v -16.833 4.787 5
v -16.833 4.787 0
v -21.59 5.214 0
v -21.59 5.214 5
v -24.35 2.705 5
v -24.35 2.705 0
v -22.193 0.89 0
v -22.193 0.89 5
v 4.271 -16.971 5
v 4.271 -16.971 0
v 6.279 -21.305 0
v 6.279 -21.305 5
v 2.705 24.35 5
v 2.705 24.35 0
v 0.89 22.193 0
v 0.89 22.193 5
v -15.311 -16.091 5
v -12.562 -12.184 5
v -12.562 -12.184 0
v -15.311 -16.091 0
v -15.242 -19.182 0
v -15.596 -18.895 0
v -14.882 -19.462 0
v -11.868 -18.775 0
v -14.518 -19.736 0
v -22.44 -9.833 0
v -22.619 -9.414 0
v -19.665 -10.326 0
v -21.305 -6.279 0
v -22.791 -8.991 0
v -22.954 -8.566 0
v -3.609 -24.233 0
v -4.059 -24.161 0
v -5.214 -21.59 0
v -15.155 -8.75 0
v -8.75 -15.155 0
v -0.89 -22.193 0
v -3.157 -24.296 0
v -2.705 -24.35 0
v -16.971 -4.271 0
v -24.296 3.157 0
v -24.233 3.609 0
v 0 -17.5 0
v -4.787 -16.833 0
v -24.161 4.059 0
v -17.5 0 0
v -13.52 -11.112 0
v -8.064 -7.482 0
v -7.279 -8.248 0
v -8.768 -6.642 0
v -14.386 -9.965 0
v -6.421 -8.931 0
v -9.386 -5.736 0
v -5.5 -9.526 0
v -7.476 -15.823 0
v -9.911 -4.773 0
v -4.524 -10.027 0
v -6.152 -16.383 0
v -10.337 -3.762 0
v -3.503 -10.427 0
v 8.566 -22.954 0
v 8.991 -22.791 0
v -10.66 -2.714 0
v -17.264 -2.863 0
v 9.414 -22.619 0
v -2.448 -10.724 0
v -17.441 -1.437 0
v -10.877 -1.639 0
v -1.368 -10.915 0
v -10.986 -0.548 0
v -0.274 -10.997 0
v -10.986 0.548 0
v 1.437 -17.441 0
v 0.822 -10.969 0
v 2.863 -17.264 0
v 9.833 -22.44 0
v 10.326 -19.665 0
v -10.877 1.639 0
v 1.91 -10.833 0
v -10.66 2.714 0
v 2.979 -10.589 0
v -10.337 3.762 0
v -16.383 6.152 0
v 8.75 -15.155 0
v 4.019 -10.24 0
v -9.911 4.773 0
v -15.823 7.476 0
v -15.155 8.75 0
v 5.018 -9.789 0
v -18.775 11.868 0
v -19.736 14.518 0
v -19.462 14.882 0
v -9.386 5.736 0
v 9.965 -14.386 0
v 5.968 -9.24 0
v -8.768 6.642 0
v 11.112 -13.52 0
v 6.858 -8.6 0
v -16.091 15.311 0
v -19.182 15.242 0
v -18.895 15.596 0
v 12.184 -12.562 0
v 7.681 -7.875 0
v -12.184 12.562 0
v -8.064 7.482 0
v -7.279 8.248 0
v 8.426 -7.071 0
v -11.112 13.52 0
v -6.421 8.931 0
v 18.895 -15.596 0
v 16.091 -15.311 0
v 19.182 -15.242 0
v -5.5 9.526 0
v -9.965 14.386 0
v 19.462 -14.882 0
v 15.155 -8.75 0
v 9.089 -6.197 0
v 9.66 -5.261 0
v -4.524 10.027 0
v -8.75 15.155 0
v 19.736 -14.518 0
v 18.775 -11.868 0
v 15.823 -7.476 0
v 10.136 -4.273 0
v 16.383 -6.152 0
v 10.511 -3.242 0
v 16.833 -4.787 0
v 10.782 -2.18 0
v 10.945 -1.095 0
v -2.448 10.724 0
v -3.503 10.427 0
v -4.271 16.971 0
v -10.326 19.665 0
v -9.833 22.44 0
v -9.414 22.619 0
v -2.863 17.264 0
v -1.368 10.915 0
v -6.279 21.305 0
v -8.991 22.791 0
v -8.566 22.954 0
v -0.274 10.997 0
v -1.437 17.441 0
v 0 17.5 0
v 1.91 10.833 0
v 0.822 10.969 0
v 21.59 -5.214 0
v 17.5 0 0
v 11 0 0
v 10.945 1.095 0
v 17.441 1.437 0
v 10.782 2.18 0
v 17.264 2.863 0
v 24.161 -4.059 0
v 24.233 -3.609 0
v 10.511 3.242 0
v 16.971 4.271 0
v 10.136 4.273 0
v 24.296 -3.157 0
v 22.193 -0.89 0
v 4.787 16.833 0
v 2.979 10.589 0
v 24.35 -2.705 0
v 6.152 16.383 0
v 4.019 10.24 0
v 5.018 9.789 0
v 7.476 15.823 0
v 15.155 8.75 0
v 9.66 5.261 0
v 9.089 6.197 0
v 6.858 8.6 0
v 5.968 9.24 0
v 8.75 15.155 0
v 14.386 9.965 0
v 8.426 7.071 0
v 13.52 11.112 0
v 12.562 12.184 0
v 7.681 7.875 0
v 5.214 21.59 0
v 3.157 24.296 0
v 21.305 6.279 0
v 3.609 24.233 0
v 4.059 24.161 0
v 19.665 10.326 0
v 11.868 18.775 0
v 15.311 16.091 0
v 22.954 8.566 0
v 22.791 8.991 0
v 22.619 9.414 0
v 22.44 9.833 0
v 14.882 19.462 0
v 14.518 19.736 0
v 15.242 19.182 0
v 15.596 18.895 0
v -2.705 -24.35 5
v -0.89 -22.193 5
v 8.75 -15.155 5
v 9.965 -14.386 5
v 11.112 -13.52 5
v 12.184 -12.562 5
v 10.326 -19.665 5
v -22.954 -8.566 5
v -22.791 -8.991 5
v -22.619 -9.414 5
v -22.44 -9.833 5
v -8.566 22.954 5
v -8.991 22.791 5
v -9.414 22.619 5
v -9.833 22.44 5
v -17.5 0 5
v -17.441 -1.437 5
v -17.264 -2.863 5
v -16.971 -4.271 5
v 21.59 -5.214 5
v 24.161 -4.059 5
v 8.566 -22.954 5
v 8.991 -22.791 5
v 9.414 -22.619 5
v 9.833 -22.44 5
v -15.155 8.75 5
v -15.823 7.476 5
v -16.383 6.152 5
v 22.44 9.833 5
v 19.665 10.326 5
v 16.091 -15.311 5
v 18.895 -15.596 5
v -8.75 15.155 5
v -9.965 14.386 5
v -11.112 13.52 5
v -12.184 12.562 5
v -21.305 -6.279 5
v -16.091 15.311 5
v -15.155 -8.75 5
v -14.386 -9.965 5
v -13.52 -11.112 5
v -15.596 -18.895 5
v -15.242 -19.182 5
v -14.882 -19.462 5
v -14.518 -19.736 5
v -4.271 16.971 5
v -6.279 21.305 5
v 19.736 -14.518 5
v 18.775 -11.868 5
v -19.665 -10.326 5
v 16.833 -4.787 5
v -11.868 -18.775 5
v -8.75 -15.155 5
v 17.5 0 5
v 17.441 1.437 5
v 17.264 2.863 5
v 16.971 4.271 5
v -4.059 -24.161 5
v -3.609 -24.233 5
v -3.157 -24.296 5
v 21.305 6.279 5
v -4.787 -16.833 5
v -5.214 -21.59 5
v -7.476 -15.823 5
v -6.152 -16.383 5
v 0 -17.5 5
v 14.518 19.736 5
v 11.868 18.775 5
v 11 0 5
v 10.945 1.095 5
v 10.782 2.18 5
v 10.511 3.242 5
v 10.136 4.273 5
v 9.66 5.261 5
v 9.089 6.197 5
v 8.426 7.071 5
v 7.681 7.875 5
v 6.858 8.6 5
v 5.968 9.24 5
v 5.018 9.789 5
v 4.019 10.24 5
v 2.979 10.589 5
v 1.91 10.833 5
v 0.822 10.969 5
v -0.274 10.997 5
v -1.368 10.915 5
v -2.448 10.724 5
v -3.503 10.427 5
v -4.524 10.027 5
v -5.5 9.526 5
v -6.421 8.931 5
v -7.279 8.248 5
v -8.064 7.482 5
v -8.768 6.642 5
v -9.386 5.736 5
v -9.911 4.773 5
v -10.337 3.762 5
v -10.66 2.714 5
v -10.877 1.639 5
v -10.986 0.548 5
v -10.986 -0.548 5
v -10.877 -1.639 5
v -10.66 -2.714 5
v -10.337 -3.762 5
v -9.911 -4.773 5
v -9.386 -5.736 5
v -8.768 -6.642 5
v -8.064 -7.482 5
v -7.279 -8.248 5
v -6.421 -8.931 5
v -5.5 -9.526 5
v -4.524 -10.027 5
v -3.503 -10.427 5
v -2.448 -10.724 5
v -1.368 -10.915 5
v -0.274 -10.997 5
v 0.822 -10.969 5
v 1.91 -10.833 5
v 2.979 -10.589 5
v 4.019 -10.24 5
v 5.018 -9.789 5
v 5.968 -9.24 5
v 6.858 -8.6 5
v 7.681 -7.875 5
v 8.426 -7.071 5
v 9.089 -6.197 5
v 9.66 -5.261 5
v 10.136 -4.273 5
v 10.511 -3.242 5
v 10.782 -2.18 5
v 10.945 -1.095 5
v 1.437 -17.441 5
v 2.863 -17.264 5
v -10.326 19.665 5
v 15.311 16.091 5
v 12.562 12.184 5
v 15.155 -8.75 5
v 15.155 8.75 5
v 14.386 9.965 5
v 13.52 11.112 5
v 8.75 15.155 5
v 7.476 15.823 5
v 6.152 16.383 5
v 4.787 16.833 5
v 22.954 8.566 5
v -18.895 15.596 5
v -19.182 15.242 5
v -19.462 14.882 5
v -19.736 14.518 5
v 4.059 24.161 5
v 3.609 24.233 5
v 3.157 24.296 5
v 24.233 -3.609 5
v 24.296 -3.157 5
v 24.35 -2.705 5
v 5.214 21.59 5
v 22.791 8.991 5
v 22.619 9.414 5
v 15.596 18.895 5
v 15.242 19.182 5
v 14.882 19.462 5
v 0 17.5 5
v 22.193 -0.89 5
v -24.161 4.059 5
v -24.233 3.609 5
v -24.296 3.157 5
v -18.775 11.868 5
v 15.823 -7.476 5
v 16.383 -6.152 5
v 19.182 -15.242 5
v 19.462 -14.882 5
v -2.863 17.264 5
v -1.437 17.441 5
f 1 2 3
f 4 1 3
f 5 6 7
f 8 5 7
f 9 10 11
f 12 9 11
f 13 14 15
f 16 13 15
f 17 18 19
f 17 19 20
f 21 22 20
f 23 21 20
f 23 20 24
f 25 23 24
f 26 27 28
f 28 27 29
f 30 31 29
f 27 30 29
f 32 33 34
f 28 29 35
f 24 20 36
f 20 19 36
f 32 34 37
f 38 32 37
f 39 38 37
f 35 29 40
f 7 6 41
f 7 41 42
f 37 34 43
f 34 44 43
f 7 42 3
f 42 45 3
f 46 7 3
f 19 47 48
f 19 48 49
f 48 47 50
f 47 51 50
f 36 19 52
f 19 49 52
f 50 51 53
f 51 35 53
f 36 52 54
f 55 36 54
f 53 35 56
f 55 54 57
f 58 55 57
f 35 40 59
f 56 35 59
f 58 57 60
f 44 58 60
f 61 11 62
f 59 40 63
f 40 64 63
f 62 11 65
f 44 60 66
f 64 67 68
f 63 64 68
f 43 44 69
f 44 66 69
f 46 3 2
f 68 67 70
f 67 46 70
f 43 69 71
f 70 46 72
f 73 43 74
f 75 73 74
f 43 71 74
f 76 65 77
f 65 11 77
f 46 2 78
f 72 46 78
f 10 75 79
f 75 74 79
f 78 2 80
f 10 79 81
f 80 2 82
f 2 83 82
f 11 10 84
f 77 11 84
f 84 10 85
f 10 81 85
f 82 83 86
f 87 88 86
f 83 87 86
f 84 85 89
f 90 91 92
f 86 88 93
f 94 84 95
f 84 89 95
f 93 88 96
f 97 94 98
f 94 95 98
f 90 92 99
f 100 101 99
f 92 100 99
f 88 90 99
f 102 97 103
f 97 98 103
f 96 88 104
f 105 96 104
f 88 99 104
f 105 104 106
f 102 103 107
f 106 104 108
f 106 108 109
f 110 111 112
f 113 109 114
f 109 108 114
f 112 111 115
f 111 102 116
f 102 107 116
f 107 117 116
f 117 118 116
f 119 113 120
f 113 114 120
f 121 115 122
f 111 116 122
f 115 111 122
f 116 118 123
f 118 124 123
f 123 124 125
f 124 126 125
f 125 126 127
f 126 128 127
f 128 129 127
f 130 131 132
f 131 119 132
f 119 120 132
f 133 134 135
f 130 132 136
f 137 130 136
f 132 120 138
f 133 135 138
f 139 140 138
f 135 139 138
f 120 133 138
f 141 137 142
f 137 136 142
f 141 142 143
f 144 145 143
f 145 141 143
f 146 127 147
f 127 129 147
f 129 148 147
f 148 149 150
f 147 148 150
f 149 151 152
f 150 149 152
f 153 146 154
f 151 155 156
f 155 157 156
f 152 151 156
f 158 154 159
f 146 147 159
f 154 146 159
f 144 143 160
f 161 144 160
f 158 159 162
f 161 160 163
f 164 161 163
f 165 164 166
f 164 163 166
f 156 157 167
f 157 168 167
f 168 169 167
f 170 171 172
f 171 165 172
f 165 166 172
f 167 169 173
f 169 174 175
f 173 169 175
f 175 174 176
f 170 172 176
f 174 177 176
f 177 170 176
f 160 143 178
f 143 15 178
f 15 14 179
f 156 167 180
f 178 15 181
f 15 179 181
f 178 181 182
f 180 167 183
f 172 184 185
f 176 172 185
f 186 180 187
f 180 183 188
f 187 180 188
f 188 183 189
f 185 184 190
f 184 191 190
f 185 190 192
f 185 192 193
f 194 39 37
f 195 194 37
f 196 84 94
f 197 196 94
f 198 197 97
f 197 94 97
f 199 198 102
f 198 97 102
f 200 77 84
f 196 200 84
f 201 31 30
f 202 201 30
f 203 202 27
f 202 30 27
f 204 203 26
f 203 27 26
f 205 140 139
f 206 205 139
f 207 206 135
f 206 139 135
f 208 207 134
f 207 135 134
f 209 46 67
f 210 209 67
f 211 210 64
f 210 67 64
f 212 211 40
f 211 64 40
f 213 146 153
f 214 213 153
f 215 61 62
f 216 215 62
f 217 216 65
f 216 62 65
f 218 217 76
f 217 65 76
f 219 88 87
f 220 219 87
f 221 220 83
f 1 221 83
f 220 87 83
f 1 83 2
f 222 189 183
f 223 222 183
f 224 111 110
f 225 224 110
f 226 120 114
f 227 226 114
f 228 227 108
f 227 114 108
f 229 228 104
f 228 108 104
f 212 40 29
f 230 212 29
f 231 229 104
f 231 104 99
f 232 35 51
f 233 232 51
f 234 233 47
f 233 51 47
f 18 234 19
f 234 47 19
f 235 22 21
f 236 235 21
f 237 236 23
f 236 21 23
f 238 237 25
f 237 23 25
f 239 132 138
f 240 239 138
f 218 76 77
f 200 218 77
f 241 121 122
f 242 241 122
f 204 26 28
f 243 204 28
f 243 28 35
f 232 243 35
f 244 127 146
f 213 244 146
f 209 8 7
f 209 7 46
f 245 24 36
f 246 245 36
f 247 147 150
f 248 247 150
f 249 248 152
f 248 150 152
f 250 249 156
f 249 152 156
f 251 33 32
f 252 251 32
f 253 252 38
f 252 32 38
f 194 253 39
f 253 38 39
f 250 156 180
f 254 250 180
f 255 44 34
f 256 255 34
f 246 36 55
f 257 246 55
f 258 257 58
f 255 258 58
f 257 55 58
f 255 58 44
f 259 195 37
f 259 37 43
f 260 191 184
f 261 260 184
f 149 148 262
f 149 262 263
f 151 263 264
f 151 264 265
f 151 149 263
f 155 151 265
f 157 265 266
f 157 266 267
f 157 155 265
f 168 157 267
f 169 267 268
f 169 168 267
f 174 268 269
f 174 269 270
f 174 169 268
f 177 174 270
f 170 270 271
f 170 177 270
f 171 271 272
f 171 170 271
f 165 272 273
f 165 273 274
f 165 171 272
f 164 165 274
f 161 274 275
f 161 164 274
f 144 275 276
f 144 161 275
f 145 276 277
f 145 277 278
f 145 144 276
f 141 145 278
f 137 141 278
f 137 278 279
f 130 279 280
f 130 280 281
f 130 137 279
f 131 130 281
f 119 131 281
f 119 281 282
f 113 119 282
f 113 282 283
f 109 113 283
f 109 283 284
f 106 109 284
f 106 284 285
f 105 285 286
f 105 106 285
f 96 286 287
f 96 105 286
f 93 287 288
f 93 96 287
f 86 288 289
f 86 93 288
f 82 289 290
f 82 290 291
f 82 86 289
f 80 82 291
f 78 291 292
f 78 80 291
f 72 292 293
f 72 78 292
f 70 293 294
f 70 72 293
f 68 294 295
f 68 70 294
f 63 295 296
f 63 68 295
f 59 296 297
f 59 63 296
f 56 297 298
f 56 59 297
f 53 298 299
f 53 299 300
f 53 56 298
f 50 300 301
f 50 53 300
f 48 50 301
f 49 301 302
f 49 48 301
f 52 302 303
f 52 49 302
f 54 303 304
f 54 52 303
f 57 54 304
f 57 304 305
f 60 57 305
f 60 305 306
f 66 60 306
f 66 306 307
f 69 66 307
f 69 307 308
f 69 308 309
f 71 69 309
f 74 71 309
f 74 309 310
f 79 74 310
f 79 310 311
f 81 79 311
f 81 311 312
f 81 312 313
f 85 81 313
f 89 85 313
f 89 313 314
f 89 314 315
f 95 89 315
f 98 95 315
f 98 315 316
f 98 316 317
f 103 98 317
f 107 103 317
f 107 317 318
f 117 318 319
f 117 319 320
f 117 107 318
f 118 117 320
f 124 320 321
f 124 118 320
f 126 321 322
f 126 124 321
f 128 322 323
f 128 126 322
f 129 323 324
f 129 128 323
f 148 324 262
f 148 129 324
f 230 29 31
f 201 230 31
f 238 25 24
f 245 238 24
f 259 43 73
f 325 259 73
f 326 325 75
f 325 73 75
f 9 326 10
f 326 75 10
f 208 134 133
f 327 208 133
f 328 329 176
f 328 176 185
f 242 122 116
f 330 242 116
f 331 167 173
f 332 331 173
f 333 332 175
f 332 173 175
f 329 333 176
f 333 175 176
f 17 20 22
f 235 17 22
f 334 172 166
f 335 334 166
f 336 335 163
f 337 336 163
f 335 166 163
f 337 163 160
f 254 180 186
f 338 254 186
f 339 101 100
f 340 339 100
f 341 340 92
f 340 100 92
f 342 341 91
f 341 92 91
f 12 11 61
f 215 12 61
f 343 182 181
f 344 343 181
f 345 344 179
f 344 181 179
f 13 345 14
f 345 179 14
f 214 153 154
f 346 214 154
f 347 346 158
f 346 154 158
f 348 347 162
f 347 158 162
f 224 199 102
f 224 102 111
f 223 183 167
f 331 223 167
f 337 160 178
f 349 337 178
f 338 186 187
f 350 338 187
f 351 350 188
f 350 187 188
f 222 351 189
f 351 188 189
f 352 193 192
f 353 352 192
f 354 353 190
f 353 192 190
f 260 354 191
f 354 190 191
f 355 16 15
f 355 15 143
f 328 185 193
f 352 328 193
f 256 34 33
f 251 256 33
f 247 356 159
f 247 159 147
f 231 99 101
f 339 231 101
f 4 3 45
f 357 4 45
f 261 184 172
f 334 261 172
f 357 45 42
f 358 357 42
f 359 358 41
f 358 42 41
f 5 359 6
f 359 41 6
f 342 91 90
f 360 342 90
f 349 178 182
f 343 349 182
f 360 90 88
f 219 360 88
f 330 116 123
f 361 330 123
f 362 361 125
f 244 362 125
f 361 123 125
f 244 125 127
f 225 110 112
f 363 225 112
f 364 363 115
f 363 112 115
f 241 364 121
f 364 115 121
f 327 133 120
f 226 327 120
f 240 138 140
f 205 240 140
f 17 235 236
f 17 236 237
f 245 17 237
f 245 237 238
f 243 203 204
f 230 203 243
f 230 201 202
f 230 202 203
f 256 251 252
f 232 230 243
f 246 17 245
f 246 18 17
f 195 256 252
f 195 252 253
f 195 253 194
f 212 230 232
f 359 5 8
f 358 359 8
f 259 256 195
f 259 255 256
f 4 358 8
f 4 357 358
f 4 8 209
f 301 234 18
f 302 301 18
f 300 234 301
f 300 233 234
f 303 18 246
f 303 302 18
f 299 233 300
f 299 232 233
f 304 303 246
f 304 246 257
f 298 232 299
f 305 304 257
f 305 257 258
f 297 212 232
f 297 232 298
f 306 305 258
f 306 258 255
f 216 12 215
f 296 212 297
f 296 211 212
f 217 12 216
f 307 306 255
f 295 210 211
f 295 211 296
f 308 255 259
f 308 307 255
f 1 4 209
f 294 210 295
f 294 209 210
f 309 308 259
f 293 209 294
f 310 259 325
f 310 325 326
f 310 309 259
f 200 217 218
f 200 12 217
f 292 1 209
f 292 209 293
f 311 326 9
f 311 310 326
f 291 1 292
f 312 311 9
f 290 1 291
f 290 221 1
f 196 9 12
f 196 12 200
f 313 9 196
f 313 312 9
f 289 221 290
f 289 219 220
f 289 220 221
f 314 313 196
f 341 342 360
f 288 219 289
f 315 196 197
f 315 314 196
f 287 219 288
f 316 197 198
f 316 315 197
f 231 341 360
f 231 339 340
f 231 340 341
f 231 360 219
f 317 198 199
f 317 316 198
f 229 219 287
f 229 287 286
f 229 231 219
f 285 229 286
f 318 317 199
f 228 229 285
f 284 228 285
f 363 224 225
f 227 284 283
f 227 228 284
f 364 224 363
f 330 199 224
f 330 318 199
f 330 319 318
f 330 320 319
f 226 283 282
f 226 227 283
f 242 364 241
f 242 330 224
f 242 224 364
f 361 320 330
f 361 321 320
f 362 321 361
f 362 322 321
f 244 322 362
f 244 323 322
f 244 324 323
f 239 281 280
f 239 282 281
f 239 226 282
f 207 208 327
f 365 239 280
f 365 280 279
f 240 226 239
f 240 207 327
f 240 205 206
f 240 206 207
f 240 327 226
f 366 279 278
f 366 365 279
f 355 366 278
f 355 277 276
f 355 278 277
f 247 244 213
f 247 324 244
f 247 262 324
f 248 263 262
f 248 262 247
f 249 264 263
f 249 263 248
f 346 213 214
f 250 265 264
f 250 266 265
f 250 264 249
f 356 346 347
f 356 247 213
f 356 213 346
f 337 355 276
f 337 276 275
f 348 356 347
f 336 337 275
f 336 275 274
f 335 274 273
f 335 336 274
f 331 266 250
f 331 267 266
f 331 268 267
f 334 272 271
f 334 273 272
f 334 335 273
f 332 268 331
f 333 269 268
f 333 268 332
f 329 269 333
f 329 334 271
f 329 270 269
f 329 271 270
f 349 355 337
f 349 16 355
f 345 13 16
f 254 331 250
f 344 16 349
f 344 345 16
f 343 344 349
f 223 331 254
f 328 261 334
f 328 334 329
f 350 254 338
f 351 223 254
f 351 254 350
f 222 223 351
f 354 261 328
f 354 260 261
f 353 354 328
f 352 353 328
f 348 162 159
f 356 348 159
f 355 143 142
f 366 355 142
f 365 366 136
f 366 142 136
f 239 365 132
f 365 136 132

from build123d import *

# Parameters (mm, degrees)
F0_R     = 11
F1_DEPTH = 5


with BuildPart() as f1:
    # F0 (on Top) → F1 (new body)
    with BuildSketch(Plane.XY):
        with BuildLine():
            ThreePointArc((16.8326, -4.786812), (17.332347, -2.416557), (17.5, 0))
            ThreePointArc((17.5, 0), (17.367213, 2.151727), (16.970865, 4.2708))
            ThreePointArc((16.970865, 4.2708), (16.218531, 6.573374), (15.155445, 8.75))
            ThreePointArc((15.155445, 8.75), (13.964584, 10.547056), (12.561801, 12.184054))
            ThreePointArc((12.561801, 12.184054), (10.758973, 13.801974), (8.75, 15.155445))
            ThreePointArc((8.75, 15.155445), (6.820156, 16.116311), (4.786812, 16.8326))
            ThreePointArc((4.786812, 16.8326), (2.416557, 17.332347), (0, 17.5))
            ThreePointArc((0, 17.5), (-2.151727, 17.367213), (-4.2708, 16.970865))
            ThreePointArc((-4.2708, 16.970865), (-6.573374, 16.218531), (-8.75, 15.155445))
            ThreePointArc((-8.75, 15.155445), (-10.547056, 13.964584), (-12.184054, 12.561801))
            ThreePointArc((-12.184054, 12.561801), (-13.801974, 10.758973), (-15.155445, 8.75))
            ThreePointArc((-15.155445, 8.75), (-16.116311, 6.820156), (-16.8326, 4.786812))
            ThreePointArc((-16.8326, 4.786812), (-17.332347, 2.416557), (-17.5, 0))
            ThreePointArc((-17.5, 0), (-17.367213, -2.151727), (-16.970865, -4.2708))
            ThreePointArc((-16.970865, -4.2708), (-16.218531, -6.573374), (-15.155445, -8.75))
            ThreePointArc((-15.155445, -8.75), (-13.964584, -10.547056), (-12.561801, -12.184054))
            ThreePointArc((-12.561801, -12.184054), (-10.758973, -13.801974), (-8.75, -15.155445))
            ThreePointArc((-8.75, -15.155445), (-6.820156, -16.116311), (-4.786812, -16.8326))
            ThreePointArc((-4.786812, -16.8326), (-2.416557, -17.332347), (0, -17.5))
            ThreePointArc((0, -17.5), (2.151727, -17.367213), (4.2708, -16.970865))
            ThreePointArc((4.2708, -16.970865), (6.573374, -16.218531), (8.75, -15.155445))
            ThreePointArc((8.75, -15.155445), (10.547056, -13.964584), (12.184054, -12.561801))
            ThreePointArc((12.184054, -12.561801), (13.801974, -10.758973), (15.155445, -8.75))
            ThreePointArc((15.155445, -8.75), (16.116311, -6.820156), (16.8326, -4.786812))
        make_face()
        Circle(F0_R, mode=Mode.SUBTRACT)
        with BuildLine():
            Line((22.193341, -0.890096), (17.5, 0))
            ThreePointArc((17.5, 0), (17.332347, -2.416557), (16.8326, -4.786812))
            Line((16.8326, -4.786812), (21.59042, -5.214441))
            Line((21.59042, -5.214441), (24.161443, -4.058901))
            ThreePointArc((24.161443, -4.058901), (24.265286, -3.38318), (24.350235, -2.704824))
            Line((24.350235, -2.704824), (22.193341, -0.890096))
        make_face()
        with BuildLine():
            ThreePointArc((15.155445, 8.75), (16.218531, 6.573374), (16.970865, 4.2708))
            Line((16.970865, 4.2708), (21.305073, 6.279372))
            Line((21.305073, 6.279372), (22.953874, 8.56561))
            ThreePointArc((22.953874, 8.56561), (22.705944, 9.202724), (22.440334, 9.832671))
            Line((22.440334, 9.832671), (19.665045, 10.325825))
            Line((19.665045, 10.325825), (15.155445, 8.75))
        make_face()
        with BuildLine():
            Line((18.774949, -11.867516), (15.155445, -8.75))
            ThreePointArc((15.155445, -8.75), (13.801974, -10.758973), (12.184054, -12.561801))
            Line((12.184054, -12.561801), (16.090632, -15.311048))
            Line((16.090632, -15.311048), (18.894973, -15.595833))
            ThreePointArc((18.894973, -15.595833), (19.322764, -15.062562), (19.73551, -14.517564))
            Line((19.73551, -14.517564), (18.774949, -11.867516))
        make_face()
        with BuildLine():
            ThreePointArc((8.75, 15.155445), (10.758973, 13.801974), (12.561801, 12.184054))
            Line((12.561801, 12.184054), (15.311048, 16.090632))
            Line((15.311048, 16.090632), (15.595833, 18.894973))
            ThreePointArc((15.595833, 18.894973), (15.062562, 19.322764), (14.517564, 19.73551))
            Line((14.517564, 19.73551), (11.867516, 18.774949))
            Line((11.867516, 18.774949), (8.75, 15.155445))
        make_face()
        with BuildLine():
            Line((10.325825, -19.665045), (8.75, -15.155445))
            ThreePointArc((8.75, -15.155445), (6.573374, -16.218531), (4.2708, -16.970865))
            Line((4.2708, -16.970865), (6.279372, -21.305073))
            Line((6.279372, -21.305073), (8.56561, -22.953874))
            ThreePointArc((8.56561, -22.953874), (9.202724, -22.705944), (9.832671, -22.440334))
            Line((9.832671, -22.440334), (10.325825, -19.665045))
        make_face()
        with BuildLine():
            ThreePointArc((0, 17.5), (2.416557, 17.332347), (4.786812, 16.8326))
            Line((4.786812, 16.8326), (5.214441, 21.59042))
            Line((5.214441, 21.59042), (4.058901, 24.161443))
            ThreePointArc((4.058901, 24.161443), (3.38318, 24.265286), (2.704824, 24.350235))
            Line((2.704824, 24.350235), (0.890096, 22.193341))
            Line((0.890096, 22.193341), (0, 17.5))
        make_face()
        with BuildLine():
            Line((-0.890096, -22.193341), (0, -17.5))
            ThreePointArc((0, -17.5), (-2.416557, -17.332347), (-4.786812, -16.8326))
            Line((-4.786812, -16.8326), (-5.214441, -21.59042))
            Line((-5.214441, -21.59042), (-4.058901, -24.161443))
            ThreePointArc((-4.058901, -24.161443), (-3.38318, -24.265286), (-2.704824, -24.350235))
            Line((-2.704824, -24.350235), (-0.890096, -22.193341))
        make_face()
        with BuildLine():
            ThreePointArc((-8.75, 15.155445), (-6.573374, 16.218531), (-4.2708, 16.970865))
            Line((-4.2708, 16.970865), (-6.279372, 21.305073))
            Line((-6.279372, 21.305073), (-8.56561, 22.953874))
            ThreePointArc((-8.56561, 22.953874), (-9.202724, 22.705944), (-9.832671, 22.440334))
            Line((-9.832671, 22.440334), (-10.325825, 19.665045))
            Line((-10.325825, 19.665045), (-8.75, 15.155445))
        make_face()
        with BuildLine():
            Line((-11.867516, -18.774949), (-8.75, -15.155445))
            ThreePointArc((-8.75, -15.155445), (-10.758973, -13.801974), (-12.561801, -12.184054))
            Line((-12.561801, -12.184054), (-15.311048, -16.090632))
            Line((-15.311048, -16.090632), (-15.595833, -18.894973))
            ThreePointArc((-15.595833, -18.894973), (-15.062562, -19.322764), (-14.517564, -19.73551))
            Line((-14.517564, -19.73551), (-11.867516, -18.774949))
        make_face()
        with BuildLine():
            ThreePointArc((-15.155445, 8.75), (-13.801974, 10.758973), (-12.184054, 12.561801))
            Line((-12.184054, 12.561801), (-16.090632, 15.311048))
            Line((-16.090632, 15.311048), (-18.894973, 15.595833))
            ThreePointArc((-18.894973, 15.595833), (-19.322764, 15.062562), (-19.73551, 14.517564))
            Line((-19.73551, 14.517564), (-18.774949, 11.867516))
            Line((-18.774949, 11.867516), (-15.155445, 8.75))
        make_face()
        with BuildLine():
            Line((-19.665045, -10.325825), (-15.155445, -8.75))
            ThreePointArc((-15.155445, -8.75), (-16.218531, -6.573374), (-16.970865, -4.2708))
            Line((-16.970865, -4.2708), (-21.305073, -6.279372))
            Line((-21.305073, -6.279372), (-22.953874, -8.56561))
            ThreePointArc((-22.953874, -8.56561), (-22.705944, -9.202724), (-22.440334, -9.832671))
            Line((-22.440334, -9.832671), (-19.665045, -10.325825))
        make_face()
        with BuildLine():
            ThreePointArc((-17.5, 0), (-17.332347, 2.416557), (-16.8326, 4.786812))
            Line((-16.8326, 4.786812), (-21.59042, 5.214441))
            Line((-21.59042, 5.214441), (-24.161443, 4.058901))
            ThreePointArc((-24.161443, 4.058901), (-24.265286, 3.38318), (-24.350235, 2.704824))
            Line((-24.350235, 2.704824), (-22.193341, 0.890096))
            Line((-22.193341, 0.890096), (-17.5, 0))
        make_face()
    extrude(amount=F1_DEPTH)


solid = f1.part
